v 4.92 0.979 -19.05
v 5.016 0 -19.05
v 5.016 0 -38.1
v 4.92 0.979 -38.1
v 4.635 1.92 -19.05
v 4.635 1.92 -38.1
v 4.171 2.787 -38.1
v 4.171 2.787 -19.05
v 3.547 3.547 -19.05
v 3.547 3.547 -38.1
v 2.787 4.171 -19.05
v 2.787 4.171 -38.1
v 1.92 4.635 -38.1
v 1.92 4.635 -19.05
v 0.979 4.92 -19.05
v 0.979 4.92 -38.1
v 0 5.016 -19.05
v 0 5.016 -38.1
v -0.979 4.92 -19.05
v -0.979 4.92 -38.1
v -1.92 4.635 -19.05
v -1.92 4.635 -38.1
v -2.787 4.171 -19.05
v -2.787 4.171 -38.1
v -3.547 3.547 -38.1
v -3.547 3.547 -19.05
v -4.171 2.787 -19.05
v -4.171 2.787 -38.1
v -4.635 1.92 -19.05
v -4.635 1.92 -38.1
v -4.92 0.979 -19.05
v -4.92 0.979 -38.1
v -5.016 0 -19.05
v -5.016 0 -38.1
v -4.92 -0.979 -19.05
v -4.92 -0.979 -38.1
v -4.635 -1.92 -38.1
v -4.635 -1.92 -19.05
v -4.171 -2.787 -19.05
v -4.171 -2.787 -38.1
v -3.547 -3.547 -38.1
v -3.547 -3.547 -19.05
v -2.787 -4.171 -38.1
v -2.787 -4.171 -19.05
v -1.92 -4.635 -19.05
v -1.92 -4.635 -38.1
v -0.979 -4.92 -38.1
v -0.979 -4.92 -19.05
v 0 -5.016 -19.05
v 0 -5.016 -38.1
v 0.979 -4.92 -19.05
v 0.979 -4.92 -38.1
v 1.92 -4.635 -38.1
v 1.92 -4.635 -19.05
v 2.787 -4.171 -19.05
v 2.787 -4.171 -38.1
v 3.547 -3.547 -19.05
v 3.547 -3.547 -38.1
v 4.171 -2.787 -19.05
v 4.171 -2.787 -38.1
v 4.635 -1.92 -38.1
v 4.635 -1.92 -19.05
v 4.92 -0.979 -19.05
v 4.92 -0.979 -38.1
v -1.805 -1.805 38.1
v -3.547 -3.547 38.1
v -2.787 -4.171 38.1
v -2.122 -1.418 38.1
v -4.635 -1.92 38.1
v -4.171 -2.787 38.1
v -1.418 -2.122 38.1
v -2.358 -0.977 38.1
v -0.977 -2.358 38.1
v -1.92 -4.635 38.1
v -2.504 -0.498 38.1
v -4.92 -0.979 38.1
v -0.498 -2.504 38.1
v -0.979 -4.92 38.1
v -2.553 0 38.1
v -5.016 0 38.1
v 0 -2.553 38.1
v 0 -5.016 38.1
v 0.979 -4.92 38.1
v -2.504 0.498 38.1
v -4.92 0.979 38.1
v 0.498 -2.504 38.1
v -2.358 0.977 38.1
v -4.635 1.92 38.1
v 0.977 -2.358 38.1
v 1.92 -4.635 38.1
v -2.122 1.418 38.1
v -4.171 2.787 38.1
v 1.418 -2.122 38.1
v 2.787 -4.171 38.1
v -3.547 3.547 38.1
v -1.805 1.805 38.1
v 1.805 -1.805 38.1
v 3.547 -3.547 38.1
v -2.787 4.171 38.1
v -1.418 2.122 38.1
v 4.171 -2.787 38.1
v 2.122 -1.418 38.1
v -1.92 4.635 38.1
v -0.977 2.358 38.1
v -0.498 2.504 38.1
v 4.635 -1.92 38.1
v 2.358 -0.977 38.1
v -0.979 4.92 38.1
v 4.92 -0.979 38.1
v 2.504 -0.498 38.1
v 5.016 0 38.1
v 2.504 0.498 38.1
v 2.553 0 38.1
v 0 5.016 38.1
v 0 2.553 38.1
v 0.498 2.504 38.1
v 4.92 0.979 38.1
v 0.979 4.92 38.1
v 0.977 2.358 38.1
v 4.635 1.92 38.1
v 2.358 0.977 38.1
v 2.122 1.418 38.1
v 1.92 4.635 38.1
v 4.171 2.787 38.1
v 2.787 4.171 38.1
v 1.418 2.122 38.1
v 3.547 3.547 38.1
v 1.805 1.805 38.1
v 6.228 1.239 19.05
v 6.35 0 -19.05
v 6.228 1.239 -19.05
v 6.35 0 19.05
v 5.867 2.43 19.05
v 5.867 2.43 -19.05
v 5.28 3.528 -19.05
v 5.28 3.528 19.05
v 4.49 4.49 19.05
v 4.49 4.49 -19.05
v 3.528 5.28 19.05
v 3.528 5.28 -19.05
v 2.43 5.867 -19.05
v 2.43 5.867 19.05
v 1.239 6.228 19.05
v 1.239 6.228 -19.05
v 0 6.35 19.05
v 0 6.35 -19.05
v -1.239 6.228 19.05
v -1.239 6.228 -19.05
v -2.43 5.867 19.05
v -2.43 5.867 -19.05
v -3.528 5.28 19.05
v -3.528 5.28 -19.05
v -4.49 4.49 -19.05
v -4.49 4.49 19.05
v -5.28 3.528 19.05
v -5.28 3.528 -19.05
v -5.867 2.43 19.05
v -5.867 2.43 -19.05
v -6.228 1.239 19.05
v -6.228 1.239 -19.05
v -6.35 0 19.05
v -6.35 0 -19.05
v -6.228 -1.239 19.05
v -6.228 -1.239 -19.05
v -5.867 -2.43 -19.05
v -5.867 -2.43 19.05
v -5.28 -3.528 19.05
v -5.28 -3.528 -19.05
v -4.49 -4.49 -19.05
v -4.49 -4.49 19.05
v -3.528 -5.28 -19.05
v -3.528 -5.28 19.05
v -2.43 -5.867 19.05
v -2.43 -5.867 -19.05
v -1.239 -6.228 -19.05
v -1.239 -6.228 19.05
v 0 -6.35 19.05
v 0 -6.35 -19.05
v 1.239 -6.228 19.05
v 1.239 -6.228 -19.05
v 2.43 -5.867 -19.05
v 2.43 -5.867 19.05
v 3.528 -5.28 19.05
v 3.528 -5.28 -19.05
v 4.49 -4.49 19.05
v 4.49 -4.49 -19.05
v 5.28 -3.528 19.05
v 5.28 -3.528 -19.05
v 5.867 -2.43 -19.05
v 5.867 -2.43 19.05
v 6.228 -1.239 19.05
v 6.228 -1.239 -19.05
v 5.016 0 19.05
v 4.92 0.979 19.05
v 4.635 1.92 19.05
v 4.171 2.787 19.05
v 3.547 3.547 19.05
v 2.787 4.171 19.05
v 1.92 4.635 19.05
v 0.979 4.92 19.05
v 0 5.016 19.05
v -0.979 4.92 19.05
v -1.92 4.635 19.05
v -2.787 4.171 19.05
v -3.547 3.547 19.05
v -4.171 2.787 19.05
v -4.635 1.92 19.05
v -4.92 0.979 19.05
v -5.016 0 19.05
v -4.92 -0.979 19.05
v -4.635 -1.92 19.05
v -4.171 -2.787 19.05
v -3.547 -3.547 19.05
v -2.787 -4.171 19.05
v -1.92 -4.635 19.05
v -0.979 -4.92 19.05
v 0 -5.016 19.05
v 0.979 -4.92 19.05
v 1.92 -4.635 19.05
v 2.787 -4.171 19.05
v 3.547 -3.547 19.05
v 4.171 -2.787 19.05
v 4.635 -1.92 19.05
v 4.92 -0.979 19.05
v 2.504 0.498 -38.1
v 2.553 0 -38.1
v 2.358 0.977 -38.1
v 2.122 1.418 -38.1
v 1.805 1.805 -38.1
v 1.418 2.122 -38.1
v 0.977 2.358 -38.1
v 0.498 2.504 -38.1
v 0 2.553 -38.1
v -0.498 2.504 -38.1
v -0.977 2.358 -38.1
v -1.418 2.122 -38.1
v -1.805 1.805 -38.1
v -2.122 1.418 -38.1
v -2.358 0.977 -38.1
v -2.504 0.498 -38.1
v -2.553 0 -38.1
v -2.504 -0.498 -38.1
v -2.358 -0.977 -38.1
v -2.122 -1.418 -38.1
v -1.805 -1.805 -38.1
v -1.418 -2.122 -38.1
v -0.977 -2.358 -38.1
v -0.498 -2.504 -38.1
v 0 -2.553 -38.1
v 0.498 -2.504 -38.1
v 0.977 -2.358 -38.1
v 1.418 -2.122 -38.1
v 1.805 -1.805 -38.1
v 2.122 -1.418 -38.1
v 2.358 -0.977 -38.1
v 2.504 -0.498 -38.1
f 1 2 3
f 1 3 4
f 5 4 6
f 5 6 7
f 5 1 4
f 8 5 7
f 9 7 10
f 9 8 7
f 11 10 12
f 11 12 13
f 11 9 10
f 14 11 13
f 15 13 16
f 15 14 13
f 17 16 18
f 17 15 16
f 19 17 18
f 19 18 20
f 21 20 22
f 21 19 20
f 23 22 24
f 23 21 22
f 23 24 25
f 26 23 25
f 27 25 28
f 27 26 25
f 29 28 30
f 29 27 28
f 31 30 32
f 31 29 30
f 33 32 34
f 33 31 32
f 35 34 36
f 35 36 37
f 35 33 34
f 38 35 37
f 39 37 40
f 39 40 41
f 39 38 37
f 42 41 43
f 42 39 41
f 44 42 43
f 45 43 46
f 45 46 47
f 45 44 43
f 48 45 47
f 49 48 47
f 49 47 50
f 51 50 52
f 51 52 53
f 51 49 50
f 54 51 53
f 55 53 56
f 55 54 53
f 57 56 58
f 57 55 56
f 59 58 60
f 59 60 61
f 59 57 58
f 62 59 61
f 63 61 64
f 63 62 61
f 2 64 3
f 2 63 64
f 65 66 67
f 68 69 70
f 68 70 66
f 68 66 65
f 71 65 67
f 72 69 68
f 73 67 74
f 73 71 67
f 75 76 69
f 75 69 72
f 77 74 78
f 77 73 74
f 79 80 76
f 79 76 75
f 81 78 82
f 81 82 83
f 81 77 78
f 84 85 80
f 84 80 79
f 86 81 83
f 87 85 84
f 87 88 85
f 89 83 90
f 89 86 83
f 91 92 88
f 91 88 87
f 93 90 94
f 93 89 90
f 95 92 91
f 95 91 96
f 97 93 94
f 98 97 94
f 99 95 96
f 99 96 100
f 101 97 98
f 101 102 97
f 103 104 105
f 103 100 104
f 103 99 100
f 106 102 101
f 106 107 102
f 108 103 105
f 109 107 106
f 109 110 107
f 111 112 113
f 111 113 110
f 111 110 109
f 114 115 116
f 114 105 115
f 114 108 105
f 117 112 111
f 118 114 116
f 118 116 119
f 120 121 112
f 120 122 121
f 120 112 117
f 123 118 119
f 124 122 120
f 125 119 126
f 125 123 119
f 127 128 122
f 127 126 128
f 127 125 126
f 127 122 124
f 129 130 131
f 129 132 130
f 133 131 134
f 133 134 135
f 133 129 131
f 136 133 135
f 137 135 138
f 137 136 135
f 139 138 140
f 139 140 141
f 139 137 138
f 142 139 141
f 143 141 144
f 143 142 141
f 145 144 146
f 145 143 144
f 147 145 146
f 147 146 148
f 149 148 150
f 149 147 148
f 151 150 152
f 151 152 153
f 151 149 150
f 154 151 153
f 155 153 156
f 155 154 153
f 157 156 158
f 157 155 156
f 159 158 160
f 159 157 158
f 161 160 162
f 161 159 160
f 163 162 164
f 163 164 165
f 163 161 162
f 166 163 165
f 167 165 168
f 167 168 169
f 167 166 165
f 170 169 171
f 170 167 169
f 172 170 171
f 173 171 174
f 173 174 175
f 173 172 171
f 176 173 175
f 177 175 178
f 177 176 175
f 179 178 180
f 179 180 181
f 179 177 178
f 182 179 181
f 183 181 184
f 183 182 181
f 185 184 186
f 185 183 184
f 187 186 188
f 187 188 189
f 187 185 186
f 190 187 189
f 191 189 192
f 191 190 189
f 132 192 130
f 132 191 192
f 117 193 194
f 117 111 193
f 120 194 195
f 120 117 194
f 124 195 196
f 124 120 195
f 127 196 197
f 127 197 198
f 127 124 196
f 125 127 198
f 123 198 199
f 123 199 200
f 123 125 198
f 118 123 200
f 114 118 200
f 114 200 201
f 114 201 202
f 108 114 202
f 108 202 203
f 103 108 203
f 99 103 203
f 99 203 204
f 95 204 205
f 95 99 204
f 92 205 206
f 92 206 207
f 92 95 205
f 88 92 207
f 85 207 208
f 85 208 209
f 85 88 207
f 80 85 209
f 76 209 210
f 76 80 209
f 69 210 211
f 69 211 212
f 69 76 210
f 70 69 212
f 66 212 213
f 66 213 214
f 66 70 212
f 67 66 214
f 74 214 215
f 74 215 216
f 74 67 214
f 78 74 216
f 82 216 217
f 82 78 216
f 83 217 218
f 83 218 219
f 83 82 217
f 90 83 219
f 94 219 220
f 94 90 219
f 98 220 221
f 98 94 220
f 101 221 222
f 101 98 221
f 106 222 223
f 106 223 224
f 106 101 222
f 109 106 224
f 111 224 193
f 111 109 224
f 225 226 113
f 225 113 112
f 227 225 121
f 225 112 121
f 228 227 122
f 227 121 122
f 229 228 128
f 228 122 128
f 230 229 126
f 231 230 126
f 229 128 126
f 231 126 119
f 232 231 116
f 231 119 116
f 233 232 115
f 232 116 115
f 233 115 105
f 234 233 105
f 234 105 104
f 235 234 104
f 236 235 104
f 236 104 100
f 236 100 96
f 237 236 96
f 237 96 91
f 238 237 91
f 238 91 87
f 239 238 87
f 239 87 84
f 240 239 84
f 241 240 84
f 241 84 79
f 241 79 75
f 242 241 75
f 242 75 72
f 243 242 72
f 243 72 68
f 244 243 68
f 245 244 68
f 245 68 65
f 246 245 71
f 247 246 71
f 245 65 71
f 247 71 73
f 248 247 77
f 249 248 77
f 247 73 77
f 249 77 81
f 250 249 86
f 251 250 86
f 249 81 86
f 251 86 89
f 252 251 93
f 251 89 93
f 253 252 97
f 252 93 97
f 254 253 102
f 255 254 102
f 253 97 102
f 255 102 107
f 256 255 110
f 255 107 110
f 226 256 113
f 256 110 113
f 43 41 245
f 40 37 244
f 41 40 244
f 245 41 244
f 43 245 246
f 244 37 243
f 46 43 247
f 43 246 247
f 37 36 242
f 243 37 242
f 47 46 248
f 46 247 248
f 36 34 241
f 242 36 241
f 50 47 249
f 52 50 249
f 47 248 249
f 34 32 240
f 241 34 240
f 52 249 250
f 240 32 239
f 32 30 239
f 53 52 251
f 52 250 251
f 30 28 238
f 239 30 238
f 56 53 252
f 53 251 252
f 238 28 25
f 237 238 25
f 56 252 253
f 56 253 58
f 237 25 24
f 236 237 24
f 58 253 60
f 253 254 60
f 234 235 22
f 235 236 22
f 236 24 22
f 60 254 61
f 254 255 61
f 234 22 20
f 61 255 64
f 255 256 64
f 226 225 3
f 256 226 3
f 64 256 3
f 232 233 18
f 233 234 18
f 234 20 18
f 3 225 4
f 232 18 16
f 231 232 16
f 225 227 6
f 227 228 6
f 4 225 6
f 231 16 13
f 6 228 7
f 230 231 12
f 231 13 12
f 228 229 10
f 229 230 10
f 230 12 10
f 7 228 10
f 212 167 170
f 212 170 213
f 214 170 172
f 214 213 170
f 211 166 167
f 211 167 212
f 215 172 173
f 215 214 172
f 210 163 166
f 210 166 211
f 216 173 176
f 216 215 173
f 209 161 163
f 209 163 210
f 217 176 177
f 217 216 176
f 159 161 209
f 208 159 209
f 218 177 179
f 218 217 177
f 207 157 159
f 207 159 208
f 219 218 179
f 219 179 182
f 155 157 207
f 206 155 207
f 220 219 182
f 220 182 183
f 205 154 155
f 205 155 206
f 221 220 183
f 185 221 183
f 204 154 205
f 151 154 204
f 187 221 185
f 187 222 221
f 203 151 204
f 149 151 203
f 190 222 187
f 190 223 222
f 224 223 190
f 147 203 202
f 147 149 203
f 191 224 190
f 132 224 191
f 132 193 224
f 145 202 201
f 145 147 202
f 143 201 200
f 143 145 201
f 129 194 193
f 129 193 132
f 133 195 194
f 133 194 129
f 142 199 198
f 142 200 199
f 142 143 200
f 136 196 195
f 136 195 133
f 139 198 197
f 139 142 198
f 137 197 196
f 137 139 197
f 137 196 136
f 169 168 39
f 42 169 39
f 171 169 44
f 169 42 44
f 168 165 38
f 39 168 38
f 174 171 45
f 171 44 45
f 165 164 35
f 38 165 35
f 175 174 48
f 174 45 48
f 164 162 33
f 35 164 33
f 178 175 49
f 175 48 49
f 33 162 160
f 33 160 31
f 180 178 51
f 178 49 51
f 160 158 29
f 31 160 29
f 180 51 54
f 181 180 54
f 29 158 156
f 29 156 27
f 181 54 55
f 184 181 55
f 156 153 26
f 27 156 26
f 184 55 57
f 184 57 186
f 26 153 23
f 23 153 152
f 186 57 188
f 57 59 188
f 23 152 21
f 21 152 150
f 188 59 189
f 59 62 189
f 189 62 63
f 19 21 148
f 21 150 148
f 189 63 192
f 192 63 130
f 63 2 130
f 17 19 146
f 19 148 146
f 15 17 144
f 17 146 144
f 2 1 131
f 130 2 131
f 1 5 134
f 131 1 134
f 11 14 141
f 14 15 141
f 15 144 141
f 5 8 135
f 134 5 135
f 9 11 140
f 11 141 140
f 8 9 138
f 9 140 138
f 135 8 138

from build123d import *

# Parameters (mm, degrees)
SKETCH1_R                  = 6.35
SKETCH1_R_2                = 5.0165
BOSS_EXTRUDE1_DEPTH        = 19.05
SKETCH1_4_R                = 5.0165
BOSS_EXTRUDE2_DEPTH        = 38.1
F_7_0_201_DIAMETER_HOLE1_D = 5.1054


with BuildPart() as part:
    # Sketch1 → Boss-Extrude1 (new, symmetric)
    with BuildSketch(Plane.XY):
        Circle(SKETCH1_R)
        Circle(SKETCH1_R_2, mode=Mode.SUBTRACT)
    extrude(amount=BOSS_EXTRUDE1_DEPTH, both=True)

    # Sketch1<4> → Boss-Extrude2 (add, symmetric)
    with BuildSketch(Plane.XY):
        Circle(SKETCH1_4_R)
    extrude(amount=BOSS_EXTRUDE2_DEPTH, both=True)

    # #7 (0.201) Diameter Hole1 (through all)
    with Locations(Plane(origin=(0, 0, -38.1), x_dir=(-1, 0, 0), z_dir=(0, 0, -1))):
        with Locations((0, 0)):
            Hole(F_7_0_201_DIAMETER_HOLE1_D / 2)


solid = part.part
